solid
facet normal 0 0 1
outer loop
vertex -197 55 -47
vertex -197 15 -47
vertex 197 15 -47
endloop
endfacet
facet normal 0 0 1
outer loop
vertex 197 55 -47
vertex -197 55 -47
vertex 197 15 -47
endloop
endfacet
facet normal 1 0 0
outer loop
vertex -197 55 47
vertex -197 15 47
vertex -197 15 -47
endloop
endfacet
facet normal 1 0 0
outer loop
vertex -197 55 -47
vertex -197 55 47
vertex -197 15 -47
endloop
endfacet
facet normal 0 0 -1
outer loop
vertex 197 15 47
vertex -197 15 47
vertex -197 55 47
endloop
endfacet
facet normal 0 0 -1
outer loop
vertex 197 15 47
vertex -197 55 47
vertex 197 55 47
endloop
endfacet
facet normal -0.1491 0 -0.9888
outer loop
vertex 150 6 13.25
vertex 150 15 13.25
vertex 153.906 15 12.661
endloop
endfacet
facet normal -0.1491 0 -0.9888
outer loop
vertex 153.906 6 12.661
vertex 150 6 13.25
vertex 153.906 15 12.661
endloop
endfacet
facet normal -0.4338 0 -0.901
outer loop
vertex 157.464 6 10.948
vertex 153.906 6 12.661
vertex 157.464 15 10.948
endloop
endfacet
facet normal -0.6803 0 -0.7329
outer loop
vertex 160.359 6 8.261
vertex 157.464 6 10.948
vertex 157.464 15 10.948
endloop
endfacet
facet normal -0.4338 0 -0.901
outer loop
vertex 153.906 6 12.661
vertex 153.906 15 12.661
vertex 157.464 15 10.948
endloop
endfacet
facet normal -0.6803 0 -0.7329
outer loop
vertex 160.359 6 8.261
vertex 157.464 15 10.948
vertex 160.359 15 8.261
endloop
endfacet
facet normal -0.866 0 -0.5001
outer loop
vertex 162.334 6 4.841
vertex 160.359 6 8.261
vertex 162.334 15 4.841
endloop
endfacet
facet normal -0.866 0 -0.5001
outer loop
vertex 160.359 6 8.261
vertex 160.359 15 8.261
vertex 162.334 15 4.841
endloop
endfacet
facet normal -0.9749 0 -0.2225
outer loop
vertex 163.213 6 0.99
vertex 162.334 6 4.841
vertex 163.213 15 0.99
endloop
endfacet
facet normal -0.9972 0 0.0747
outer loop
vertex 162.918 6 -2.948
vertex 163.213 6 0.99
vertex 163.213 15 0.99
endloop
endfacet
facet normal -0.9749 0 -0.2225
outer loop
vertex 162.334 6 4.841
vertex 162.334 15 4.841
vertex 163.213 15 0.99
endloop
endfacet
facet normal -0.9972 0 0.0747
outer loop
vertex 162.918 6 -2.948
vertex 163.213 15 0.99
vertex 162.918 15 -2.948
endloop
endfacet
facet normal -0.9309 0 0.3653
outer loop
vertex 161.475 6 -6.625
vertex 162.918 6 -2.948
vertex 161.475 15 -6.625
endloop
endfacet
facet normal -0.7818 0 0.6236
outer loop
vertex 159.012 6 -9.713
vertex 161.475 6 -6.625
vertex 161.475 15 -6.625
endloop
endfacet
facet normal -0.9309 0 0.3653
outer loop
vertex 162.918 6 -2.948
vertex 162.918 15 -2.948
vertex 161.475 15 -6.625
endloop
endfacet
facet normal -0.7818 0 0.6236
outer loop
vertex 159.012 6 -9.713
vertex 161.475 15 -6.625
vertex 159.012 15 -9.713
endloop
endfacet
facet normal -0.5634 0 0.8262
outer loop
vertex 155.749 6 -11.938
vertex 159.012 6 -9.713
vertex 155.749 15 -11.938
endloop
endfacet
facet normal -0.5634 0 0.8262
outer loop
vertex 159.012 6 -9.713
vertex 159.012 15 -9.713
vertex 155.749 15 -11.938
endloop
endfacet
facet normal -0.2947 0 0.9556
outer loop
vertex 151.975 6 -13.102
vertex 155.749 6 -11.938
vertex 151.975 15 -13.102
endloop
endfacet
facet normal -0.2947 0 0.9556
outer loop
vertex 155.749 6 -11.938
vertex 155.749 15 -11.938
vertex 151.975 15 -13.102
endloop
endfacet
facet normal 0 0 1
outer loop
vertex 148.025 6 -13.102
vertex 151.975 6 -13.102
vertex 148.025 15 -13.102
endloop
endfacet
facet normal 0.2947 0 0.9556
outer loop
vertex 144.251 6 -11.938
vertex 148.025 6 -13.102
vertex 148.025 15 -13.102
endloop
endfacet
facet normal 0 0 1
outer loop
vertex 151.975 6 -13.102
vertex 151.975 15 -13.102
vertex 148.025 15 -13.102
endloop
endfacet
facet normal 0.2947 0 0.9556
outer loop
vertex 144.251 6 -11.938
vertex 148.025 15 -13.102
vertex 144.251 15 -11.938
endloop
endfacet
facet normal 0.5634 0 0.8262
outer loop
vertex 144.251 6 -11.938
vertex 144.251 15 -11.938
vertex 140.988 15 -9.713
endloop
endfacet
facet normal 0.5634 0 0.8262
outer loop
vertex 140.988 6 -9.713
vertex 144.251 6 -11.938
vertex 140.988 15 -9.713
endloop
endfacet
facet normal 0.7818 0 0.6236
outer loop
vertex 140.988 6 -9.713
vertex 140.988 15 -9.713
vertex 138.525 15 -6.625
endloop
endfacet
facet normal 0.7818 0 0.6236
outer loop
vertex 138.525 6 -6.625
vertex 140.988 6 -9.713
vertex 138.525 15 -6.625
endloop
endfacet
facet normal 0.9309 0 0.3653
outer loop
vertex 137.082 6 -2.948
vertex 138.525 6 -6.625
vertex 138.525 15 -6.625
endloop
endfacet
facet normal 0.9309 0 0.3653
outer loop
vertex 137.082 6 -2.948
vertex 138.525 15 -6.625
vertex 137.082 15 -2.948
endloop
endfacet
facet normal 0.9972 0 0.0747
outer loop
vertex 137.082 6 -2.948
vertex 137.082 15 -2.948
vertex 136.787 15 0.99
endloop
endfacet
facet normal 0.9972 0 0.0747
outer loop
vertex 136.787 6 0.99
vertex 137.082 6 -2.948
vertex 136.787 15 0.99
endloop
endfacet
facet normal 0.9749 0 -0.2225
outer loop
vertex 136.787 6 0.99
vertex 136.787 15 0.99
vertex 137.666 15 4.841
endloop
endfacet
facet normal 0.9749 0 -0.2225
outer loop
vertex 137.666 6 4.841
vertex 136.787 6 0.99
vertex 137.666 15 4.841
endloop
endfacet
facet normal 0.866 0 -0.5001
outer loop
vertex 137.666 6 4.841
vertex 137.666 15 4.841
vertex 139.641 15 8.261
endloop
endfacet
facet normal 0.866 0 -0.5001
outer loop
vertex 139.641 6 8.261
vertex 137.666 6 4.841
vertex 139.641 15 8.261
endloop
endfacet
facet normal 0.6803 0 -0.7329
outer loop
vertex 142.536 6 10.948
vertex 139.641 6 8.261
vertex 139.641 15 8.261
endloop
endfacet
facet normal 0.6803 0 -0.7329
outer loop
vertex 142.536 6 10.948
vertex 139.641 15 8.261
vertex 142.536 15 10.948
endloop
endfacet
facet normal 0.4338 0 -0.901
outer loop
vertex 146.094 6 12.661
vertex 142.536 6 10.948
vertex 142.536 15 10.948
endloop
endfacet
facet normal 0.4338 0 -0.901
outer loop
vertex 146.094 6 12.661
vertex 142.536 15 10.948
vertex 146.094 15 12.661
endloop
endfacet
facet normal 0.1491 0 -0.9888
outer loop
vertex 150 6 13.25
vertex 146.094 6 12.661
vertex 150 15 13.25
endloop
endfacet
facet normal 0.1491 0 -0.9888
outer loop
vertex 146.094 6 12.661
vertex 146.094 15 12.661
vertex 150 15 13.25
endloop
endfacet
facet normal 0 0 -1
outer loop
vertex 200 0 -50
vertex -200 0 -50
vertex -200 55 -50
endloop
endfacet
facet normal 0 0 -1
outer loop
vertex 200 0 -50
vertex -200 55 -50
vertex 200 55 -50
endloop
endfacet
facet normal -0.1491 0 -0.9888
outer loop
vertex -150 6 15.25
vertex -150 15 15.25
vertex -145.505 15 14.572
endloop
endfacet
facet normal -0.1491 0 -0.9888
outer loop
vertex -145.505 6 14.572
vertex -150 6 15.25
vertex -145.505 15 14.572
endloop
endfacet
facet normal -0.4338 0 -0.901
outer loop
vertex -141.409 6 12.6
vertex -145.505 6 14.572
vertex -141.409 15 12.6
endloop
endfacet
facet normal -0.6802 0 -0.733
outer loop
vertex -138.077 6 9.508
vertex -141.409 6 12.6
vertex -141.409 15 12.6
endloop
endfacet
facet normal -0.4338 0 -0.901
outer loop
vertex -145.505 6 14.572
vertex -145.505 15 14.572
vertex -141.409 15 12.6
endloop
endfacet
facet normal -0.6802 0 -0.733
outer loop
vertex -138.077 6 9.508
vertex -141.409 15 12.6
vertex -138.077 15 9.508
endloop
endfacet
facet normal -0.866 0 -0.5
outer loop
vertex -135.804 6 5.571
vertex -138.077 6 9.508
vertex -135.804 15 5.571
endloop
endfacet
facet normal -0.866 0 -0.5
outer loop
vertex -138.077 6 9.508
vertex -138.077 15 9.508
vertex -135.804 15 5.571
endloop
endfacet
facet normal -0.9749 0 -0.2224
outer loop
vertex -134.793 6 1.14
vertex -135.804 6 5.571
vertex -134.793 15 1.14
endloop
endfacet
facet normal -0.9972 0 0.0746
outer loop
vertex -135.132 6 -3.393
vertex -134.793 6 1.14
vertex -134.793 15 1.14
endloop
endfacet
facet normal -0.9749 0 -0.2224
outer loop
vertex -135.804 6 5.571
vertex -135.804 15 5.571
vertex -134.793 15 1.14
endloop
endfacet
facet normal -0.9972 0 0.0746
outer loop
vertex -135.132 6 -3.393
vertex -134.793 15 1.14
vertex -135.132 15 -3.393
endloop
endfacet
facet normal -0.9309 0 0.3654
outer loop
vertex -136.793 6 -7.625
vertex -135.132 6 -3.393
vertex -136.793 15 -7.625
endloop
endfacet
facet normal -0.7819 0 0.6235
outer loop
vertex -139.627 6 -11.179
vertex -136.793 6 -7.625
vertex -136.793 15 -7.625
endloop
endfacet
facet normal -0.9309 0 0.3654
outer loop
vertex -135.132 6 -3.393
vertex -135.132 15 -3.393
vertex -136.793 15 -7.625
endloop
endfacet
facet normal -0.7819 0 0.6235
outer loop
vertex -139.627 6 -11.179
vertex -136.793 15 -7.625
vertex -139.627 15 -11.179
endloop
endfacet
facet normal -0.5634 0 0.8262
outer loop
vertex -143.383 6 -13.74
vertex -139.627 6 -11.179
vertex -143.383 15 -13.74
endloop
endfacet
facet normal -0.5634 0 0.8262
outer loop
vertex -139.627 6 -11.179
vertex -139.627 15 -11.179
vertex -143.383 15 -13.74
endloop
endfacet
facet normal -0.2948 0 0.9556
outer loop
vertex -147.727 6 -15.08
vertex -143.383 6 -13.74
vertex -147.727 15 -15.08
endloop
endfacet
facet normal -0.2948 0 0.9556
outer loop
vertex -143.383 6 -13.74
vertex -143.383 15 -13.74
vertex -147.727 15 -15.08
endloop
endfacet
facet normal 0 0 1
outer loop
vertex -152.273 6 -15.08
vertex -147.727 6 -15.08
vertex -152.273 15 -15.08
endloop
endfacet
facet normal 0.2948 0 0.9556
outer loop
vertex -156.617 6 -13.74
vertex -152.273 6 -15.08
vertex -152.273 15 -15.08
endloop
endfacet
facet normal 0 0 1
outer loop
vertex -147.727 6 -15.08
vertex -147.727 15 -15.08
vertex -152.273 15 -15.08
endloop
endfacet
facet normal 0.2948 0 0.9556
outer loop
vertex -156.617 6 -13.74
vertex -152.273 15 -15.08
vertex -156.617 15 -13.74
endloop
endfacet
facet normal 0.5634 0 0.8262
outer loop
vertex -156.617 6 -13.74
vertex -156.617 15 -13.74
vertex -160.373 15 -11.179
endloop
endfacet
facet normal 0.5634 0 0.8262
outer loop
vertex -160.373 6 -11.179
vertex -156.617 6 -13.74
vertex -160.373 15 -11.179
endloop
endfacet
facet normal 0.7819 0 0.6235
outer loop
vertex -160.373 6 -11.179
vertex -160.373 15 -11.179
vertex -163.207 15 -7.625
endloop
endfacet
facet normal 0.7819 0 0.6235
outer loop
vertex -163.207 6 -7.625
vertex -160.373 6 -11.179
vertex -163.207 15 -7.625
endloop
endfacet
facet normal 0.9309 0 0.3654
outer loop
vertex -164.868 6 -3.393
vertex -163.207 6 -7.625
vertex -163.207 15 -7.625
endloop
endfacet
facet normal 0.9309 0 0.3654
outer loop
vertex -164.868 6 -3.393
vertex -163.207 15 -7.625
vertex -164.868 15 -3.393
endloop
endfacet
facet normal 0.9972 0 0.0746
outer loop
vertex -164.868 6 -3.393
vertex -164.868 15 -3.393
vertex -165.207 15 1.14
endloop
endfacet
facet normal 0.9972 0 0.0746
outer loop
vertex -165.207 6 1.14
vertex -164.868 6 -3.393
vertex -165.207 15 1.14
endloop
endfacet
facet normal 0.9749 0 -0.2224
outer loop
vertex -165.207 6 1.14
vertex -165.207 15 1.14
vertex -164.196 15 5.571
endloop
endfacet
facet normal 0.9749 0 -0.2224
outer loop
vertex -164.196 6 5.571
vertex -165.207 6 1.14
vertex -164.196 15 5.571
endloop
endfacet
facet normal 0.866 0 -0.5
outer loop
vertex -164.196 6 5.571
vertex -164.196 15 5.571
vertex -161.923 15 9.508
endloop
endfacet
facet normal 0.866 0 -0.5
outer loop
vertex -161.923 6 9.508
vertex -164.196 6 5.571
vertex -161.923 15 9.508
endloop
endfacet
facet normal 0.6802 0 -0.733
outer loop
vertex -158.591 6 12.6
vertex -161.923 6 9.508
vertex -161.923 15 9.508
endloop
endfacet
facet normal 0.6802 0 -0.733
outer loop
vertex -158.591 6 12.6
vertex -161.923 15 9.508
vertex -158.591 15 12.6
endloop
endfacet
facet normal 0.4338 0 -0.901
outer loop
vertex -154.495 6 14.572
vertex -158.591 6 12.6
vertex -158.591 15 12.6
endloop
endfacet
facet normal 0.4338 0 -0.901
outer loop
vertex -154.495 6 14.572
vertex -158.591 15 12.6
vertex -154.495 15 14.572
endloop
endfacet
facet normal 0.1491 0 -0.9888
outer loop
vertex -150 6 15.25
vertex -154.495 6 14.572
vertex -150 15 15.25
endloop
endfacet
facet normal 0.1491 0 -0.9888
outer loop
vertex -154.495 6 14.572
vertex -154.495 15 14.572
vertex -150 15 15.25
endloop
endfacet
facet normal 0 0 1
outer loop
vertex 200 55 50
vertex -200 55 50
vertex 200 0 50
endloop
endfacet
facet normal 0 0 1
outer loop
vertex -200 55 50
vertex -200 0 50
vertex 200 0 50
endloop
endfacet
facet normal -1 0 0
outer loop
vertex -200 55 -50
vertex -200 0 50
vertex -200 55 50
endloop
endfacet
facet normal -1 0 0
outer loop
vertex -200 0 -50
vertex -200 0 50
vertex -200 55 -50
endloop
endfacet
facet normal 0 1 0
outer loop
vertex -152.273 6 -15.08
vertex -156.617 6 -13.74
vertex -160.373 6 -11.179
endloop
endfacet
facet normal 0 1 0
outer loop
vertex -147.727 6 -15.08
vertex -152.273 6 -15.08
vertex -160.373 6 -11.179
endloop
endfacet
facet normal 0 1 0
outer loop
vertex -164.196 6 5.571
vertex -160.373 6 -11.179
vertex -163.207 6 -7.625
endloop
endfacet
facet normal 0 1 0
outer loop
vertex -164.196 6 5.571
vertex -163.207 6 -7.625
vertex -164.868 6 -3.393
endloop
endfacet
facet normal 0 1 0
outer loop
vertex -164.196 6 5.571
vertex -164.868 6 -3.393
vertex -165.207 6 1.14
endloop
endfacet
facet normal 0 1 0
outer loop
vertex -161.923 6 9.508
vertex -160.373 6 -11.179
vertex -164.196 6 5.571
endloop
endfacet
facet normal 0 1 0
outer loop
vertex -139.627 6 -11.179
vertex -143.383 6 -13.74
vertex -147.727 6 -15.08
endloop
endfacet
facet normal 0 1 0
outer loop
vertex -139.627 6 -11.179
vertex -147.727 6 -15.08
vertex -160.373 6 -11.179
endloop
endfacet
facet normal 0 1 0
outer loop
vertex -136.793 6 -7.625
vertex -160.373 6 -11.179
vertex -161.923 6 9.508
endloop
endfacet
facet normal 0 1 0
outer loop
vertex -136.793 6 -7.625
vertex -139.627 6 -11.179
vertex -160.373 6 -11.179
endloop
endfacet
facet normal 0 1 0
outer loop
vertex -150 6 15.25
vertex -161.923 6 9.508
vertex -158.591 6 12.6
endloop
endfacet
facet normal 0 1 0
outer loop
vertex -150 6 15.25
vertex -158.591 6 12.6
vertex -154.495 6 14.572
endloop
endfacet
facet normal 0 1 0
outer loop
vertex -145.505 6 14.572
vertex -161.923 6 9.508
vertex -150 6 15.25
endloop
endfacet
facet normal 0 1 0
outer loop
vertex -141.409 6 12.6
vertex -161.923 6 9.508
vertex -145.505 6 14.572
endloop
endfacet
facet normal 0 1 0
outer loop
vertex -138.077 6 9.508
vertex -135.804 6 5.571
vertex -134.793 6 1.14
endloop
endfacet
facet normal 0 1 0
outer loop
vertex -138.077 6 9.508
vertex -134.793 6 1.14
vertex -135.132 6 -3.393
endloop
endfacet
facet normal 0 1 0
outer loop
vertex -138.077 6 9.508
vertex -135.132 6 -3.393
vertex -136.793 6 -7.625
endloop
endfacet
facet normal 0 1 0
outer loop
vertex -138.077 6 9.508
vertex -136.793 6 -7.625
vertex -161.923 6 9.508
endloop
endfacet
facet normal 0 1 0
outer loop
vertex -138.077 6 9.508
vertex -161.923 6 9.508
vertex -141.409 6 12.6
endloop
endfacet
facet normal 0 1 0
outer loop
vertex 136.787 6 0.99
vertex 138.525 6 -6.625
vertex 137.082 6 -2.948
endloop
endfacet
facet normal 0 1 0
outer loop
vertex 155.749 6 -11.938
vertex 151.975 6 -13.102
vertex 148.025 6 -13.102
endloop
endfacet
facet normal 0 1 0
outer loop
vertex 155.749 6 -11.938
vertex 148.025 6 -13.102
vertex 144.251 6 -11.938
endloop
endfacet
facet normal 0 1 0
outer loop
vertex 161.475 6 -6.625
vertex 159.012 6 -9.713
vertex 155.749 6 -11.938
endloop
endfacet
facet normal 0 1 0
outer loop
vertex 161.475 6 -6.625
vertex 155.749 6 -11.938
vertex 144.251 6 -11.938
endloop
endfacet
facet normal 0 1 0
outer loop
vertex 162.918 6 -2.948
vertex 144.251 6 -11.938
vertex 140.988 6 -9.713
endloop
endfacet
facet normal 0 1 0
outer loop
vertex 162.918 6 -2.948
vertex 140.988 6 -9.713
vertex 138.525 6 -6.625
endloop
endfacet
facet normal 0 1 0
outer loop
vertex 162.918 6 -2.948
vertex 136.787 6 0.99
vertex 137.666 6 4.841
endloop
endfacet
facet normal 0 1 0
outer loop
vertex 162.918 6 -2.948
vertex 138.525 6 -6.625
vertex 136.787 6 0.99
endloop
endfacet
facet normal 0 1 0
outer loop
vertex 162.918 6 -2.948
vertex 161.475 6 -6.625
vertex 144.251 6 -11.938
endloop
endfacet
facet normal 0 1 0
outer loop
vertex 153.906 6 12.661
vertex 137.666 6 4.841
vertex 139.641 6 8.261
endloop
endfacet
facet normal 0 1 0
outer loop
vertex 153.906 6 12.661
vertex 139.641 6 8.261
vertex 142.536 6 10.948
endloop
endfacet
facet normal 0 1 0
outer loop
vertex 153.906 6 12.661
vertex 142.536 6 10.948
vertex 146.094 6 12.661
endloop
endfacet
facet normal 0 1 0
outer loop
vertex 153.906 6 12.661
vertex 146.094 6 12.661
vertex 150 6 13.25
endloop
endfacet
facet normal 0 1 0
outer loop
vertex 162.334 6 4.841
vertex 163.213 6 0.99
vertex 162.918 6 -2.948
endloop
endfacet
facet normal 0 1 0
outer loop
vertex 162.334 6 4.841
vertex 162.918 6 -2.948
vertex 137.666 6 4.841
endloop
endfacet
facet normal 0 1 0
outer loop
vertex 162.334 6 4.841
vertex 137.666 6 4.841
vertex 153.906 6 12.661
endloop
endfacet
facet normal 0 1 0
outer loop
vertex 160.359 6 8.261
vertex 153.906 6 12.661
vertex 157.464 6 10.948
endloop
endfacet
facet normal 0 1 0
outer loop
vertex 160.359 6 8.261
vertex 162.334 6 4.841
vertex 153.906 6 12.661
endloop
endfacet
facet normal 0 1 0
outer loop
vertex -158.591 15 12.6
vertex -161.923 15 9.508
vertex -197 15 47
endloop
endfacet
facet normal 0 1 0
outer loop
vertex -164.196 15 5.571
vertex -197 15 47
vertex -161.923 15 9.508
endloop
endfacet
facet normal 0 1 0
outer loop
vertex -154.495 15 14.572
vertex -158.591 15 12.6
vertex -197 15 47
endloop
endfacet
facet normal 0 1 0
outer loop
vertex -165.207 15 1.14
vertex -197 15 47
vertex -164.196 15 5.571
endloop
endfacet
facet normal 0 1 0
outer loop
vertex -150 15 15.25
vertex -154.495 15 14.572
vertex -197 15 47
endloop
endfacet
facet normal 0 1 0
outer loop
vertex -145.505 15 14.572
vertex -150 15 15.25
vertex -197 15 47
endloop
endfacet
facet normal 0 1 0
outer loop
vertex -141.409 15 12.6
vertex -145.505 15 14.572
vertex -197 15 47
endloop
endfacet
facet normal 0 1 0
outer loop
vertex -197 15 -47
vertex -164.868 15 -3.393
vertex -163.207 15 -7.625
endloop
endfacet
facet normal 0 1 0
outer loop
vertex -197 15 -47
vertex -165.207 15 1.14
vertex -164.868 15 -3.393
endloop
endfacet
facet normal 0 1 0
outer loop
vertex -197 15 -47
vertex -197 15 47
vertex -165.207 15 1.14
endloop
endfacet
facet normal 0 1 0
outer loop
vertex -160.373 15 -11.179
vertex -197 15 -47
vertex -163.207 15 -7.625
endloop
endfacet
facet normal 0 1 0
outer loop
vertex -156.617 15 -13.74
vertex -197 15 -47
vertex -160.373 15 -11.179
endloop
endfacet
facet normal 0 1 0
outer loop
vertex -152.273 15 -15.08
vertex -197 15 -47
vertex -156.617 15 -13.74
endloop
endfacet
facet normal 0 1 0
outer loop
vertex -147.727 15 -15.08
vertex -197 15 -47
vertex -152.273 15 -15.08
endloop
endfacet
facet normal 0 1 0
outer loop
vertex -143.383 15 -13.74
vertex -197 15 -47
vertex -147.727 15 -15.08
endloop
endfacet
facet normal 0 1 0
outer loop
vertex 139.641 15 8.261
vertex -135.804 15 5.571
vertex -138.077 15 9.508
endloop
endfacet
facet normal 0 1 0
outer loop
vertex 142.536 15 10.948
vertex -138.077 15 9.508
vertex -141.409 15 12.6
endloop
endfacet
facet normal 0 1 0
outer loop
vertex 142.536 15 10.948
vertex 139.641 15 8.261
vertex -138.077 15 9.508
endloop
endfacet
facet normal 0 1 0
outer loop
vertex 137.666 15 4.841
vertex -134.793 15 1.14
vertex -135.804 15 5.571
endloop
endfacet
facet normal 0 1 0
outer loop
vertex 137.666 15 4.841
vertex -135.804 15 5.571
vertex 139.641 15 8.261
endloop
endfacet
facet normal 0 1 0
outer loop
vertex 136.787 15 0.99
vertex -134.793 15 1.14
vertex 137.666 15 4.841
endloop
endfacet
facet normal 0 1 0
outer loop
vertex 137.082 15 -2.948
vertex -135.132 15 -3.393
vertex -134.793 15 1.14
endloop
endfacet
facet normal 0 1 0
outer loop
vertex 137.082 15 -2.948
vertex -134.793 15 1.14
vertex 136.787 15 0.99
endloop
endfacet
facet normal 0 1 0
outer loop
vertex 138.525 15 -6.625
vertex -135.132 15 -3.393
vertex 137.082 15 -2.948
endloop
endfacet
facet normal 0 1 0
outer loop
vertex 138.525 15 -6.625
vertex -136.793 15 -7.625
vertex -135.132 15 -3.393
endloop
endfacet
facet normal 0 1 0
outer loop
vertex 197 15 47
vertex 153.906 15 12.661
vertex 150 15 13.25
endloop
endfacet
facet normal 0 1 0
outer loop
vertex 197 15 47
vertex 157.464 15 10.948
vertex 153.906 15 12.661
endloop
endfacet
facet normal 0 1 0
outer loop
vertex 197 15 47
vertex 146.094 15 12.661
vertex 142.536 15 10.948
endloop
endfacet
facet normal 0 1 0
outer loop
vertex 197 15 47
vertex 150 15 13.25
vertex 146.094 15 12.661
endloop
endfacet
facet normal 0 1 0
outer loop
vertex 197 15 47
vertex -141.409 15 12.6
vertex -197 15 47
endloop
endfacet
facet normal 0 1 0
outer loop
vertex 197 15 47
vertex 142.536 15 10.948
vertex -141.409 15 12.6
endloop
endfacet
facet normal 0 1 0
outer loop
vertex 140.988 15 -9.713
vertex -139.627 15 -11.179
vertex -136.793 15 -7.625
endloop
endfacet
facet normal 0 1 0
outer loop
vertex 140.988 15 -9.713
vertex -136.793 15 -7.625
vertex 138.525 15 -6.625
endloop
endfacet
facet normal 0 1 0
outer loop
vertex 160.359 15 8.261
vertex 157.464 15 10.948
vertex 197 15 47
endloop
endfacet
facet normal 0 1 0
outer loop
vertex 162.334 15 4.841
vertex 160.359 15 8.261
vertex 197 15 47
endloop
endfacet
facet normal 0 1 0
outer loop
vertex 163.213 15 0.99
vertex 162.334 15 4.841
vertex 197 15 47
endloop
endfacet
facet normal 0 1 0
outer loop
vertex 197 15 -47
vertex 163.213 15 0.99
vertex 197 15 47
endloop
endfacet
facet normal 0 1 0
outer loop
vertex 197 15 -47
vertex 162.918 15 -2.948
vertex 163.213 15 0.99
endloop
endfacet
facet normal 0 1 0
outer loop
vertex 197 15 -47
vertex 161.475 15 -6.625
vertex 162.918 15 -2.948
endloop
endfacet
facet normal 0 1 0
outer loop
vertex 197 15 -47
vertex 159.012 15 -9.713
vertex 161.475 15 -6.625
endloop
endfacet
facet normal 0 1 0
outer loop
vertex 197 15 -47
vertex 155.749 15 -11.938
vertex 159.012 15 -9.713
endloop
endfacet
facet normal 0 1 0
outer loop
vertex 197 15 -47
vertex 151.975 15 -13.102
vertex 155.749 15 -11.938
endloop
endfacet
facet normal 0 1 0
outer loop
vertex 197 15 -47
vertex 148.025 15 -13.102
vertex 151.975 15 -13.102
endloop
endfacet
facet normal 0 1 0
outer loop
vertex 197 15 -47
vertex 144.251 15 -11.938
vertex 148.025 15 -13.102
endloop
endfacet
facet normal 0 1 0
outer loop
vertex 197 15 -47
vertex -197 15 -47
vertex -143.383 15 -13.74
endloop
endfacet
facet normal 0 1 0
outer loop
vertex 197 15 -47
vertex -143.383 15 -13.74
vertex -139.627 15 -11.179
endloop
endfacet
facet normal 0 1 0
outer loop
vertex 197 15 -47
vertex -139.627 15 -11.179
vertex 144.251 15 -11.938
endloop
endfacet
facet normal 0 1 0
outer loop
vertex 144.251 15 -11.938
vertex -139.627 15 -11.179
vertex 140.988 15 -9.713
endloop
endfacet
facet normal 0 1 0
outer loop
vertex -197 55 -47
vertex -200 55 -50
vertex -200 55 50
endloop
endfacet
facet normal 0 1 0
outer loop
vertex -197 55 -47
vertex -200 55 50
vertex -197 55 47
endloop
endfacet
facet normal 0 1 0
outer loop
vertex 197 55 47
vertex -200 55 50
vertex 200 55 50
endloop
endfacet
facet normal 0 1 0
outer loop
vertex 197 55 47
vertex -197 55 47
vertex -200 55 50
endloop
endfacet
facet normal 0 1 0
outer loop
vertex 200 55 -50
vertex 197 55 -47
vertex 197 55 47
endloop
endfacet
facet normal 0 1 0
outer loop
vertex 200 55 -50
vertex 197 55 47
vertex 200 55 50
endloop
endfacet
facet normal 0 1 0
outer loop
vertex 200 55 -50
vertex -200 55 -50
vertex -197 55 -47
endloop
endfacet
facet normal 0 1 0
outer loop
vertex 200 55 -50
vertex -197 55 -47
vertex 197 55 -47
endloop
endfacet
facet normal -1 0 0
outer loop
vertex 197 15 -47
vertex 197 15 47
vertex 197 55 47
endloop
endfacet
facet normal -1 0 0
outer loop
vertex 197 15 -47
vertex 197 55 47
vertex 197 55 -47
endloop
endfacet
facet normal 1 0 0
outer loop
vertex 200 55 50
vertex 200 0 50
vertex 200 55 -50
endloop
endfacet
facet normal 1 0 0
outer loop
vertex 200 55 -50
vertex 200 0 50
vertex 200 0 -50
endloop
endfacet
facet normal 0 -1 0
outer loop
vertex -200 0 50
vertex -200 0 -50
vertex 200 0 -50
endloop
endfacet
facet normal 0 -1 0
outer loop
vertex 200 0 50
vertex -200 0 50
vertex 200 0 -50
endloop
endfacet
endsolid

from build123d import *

# Parameters (mm, degrees)
SKETCH1_W           = 400
SKETCH1_H           = 100
BOSS_EXTRUDE1_DEPTH = 15
SKETCH2_R           = 15.25
SKETCH2_R_2         = 13.25
CUT_EXTRUDE1_DEPTH  = 9
SKETCH3_W           = 400
SKETCH3_H           = 100
SKETCH3_W_2         = 394
SKETCH3_H_2         = 94
BOSS_EXTRUDE2_DEPTH = 40


with BuildPart() as part:
    # Sketch1 → Boss-Extrude1 (new body)
    with BuildSketch(Plane(origin=(0, 0, 0), x_dir=(1, 0, 0), z_dir=(0, 1, 0))):
        Rectangle(SKETCH1_W, SKETCH1_H)
    extrude(amount=BOSS_EXTRUDE1_DEPTH)

    # Sketch2 → Cut-Extrude1 (cut)
    with BuildSketch(Plane(origin=(0, 15, 0), x_dir=(1, 0, 0), z_dir=(0, 1, 0))):
        with Locations(Location((-150, 0, 0), (0, 0, 270))):
            Circle(SKETCH2_R)
        with Locations(Location((150, 0, 0), (0, 0, 270))):
            Circle(SKETCH2_R_2)
    extrude(amount=-CUT_EXTRUDE1_DEPTH, mode=Mode.SUBTRACT)

    # Sketch3 → Boss-Extrude2 (add)
    with BuildSketch(Plane(origin=(0, 15, 0), x_dir=(1, 0, 0), z_dir=(0, 1, 0))):
        Rectangle(SKETCH3_W, SKETCH3_H)
        Rectangle(SKETCH3_W_2, SKETCH3_H_2, mode=Mode.SUBTRACT)
    extrude(amount=BOSS_EXTRUDE2_DEPTH)


solid = part.part
